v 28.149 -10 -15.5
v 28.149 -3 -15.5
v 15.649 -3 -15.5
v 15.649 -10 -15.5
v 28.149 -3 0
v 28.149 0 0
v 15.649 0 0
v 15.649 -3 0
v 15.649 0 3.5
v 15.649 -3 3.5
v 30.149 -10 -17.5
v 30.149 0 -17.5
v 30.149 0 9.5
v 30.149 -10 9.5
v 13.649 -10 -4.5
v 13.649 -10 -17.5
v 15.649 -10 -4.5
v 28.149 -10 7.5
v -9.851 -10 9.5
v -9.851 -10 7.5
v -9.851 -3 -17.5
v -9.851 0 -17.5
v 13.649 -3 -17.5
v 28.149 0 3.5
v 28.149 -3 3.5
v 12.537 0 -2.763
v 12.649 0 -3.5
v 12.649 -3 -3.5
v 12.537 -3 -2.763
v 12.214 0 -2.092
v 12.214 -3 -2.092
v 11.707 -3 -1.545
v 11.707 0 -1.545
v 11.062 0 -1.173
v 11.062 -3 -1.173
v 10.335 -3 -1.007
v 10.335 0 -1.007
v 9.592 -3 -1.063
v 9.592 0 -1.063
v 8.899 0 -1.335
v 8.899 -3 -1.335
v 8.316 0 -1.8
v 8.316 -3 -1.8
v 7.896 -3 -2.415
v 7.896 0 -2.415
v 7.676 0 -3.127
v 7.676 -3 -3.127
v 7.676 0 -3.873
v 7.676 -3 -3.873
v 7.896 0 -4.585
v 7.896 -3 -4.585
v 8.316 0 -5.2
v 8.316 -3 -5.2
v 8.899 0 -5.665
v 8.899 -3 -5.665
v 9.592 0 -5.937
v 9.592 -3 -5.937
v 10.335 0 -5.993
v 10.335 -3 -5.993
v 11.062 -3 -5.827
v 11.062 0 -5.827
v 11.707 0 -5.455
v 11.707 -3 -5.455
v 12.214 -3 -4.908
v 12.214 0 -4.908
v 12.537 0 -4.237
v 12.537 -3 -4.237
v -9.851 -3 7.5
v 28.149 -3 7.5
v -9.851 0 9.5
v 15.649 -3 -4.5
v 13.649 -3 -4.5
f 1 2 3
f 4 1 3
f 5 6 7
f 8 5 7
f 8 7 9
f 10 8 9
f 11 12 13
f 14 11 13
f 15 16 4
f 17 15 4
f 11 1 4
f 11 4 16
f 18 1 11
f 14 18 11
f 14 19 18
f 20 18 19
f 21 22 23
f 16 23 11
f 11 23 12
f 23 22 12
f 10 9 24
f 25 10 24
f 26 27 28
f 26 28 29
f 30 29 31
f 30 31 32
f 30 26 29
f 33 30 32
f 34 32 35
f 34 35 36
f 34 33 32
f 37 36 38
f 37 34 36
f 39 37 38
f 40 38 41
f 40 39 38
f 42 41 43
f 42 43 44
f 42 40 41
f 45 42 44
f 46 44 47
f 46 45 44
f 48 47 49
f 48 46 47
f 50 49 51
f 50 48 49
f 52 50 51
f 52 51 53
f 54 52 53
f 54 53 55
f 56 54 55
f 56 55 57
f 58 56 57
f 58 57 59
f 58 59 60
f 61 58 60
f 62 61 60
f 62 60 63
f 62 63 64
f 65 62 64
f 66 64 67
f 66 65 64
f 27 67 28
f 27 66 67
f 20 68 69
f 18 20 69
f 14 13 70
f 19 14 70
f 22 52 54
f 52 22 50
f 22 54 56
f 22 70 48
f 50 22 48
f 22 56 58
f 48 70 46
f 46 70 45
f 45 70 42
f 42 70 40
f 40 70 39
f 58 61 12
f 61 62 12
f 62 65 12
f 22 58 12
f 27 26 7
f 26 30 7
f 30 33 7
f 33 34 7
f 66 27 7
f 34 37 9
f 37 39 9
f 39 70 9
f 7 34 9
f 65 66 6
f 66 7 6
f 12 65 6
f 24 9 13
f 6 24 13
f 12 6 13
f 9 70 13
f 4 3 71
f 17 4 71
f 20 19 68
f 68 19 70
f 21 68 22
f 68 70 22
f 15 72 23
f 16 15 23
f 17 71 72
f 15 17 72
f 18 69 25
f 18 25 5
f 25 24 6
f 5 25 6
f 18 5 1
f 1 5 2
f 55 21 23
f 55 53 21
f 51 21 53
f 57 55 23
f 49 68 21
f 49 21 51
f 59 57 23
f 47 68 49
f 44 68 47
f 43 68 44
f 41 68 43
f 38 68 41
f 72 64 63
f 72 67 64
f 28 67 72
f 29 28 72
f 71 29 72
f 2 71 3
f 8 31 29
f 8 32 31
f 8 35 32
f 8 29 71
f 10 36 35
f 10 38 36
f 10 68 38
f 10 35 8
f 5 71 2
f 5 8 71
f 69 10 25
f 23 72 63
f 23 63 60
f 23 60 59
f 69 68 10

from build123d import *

# Parameters (mm, degrees)
F1_DEPTH = 10
F0_R     = 2.5
F2_DEPTH = 3


with BuildPart() as f1:
    # F0 (on Front) → F1 (new body)
    with BuildSketch(Plane.XZ):
        Polygon((13.648517, -4.5), (13.648517, -17.5), (30.148517, -17.5), (30.148517, 9.5), (-9.851483, 9.5), (-9.851483, 7.5), (28.148517, 7.5), (28.148517, 3.5), (28.148517, 0), (28.148517, -15.5), (15.648517, -15.5), (15.648517, -4.5), align=None)
    extrude(amount=F1_DEPTH)

    # F0 (on Front) → F2 (join)
    with BuildSketch(Plane.XZ):
        Polygon((-9.851483, 7.5), (-9.851483, -17.5), (13.648517, -17.5), (13.648517, -4.5), (15.648517, -4.5), (15.648517, -15.5), (28.148517, -15.5), (28.148517, 0), (15.648517, 0), (15.648517, 3.5), (28.148517, 3.5), (28.148517, 7.5), align=None)
        with Locations((10.148517, -3.5)):
            Circle(F0_R, mode=Mode.SUBTRACT)
    extrude(amount=F2_DEPTH)


solid = f1.part
